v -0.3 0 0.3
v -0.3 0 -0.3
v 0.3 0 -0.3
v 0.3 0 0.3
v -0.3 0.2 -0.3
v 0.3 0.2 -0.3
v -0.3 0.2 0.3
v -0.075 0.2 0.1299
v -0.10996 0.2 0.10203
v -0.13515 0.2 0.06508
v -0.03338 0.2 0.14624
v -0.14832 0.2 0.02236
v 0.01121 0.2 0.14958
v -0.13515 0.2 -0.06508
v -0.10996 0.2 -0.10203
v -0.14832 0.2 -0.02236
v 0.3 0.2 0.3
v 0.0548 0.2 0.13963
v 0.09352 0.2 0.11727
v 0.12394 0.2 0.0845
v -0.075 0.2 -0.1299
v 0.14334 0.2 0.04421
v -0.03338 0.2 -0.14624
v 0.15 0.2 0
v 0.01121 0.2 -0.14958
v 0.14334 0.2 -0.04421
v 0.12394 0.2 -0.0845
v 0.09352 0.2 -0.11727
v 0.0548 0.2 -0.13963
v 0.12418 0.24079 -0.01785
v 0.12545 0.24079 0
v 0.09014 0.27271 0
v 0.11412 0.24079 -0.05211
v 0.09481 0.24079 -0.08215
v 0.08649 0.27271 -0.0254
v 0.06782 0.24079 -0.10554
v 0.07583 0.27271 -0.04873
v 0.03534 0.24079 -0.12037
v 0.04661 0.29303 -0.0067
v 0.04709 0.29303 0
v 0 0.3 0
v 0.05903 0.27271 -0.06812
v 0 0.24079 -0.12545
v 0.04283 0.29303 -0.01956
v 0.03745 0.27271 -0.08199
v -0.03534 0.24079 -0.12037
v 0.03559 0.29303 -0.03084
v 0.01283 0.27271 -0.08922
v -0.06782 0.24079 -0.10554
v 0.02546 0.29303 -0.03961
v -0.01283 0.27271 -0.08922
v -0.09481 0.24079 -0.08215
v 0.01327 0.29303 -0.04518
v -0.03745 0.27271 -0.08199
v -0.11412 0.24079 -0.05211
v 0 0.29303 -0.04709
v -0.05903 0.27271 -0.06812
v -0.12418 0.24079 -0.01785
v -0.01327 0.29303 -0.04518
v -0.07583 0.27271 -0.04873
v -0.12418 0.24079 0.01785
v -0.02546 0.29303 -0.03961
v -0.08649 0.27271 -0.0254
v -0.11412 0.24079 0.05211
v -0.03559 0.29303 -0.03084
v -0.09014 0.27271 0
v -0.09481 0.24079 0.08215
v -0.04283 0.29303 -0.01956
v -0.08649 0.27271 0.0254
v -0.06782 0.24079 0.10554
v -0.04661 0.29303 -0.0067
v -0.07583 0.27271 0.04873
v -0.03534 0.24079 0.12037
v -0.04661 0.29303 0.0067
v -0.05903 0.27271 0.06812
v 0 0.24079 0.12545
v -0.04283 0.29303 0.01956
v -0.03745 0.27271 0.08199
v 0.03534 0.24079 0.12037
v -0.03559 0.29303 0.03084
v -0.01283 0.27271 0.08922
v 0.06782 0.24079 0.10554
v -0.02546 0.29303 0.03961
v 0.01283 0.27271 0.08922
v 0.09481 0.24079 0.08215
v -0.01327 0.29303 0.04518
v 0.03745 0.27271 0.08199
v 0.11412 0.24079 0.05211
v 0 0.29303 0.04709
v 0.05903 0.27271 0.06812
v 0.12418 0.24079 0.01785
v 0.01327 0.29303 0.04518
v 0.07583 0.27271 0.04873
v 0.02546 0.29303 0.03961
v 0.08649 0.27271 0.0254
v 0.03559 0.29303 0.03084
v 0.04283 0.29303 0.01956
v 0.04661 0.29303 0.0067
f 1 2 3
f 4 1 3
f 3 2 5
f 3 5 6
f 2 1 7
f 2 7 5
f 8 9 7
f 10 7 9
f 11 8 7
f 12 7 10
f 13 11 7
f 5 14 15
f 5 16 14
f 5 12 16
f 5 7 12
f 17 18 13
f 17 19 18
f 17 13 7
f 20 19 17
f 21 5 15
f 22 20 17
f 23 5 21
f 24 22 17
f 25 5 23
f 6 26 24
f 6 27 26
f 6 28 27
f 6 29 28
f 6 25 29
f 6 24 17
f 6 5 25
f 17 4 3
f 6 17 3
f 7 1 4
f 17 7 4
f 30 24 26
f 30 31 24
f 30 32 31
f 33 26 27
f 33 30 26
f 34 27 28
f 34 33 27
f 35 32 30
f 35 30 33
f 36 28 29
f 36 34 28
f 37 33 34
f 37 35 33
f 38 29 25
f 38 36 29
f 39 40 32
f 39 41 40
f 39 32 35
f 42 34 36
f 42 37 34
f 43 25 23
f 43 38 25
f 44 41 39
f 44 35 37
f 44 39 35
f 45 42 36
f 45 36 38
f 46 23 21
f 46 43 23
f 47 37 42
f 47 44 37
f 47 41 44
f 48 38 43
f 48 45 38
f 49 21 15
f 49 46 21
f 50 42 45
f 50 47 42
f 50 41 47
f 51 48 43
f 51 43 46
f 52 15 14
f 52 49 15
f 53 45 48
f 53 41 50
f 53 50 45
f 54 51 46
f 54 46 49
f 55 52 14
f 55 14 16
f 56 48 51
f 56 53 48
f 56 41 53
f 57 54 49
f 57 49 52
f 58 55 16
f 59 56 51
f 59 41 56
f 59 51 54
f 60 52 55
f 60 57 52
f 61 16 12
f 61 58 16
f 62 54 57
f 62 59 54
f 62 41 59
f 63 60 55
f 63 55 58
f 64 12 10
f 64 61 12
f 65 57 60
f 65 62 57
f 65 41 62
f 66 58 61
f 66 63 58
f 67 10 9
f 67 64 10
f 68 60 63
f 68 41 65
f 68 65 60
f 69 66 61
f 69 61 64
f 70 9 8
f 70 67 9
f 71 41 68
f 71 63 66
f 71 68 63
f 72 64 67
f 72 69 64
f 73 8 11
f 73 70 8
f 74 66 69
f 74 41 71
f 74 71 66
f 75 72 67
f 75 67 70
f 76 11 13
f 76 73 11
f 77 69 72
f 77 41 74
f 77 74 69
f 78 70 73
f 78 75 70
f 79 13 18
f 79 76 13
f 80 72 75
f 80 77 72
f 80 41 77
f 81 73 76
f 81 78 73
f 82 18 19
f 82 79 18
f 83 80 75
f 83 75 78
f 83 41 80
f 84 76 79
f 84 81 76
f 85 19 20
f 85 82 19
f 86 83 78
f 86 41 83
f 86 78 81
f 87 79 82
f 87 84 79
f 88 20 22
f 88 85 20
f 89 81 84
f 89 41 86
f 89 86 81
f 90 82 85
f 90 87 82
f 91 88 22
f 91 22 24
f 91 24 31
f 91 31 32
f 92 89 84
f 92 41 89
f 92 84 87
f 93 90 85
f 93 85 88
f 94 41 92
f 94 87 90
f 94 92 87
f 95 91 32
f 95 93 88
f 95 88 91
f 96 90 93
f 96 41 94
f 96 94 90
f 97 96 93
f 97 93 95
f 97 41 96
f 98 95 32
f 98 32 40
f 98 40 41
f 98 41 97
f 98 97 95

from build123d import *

# Parameters (mm, degrees)
SKETCH1_W           = 0.6
SKETCH1_H           = 0.6
BOSS_EXTRUDE1_DEPTH = 0.2


with BuildPart() as part:
    # Sketch1 → Boss-Extrude1 (new body)
    with BuildSketch(Plane(origin=(0, 0, 0), x_dir=(1, 0, 0), z_dir=(0, 1, 0))):
        Rectangle(SKETCH1_W, SKETCH1_H)
    extrude(amount=BOSS_EXTRUDE1_DEPTH)

    # Sketch2 → Revolve1 (revolve)
    with BuildSketch(Plane.XY):
        with BuildLine():
            Line((0, 0.2), (0.15, 0.2))
            ThreePointArc((0.15, 0.2), (0.090138782, 0.272708173), (0, 0.3))
            Line((0, 0.3), (0, 0.2))
        make_face()
    revolve(axis=Axis((0, 0.2, 0), (0, 1, 0)))


solid = part.part
